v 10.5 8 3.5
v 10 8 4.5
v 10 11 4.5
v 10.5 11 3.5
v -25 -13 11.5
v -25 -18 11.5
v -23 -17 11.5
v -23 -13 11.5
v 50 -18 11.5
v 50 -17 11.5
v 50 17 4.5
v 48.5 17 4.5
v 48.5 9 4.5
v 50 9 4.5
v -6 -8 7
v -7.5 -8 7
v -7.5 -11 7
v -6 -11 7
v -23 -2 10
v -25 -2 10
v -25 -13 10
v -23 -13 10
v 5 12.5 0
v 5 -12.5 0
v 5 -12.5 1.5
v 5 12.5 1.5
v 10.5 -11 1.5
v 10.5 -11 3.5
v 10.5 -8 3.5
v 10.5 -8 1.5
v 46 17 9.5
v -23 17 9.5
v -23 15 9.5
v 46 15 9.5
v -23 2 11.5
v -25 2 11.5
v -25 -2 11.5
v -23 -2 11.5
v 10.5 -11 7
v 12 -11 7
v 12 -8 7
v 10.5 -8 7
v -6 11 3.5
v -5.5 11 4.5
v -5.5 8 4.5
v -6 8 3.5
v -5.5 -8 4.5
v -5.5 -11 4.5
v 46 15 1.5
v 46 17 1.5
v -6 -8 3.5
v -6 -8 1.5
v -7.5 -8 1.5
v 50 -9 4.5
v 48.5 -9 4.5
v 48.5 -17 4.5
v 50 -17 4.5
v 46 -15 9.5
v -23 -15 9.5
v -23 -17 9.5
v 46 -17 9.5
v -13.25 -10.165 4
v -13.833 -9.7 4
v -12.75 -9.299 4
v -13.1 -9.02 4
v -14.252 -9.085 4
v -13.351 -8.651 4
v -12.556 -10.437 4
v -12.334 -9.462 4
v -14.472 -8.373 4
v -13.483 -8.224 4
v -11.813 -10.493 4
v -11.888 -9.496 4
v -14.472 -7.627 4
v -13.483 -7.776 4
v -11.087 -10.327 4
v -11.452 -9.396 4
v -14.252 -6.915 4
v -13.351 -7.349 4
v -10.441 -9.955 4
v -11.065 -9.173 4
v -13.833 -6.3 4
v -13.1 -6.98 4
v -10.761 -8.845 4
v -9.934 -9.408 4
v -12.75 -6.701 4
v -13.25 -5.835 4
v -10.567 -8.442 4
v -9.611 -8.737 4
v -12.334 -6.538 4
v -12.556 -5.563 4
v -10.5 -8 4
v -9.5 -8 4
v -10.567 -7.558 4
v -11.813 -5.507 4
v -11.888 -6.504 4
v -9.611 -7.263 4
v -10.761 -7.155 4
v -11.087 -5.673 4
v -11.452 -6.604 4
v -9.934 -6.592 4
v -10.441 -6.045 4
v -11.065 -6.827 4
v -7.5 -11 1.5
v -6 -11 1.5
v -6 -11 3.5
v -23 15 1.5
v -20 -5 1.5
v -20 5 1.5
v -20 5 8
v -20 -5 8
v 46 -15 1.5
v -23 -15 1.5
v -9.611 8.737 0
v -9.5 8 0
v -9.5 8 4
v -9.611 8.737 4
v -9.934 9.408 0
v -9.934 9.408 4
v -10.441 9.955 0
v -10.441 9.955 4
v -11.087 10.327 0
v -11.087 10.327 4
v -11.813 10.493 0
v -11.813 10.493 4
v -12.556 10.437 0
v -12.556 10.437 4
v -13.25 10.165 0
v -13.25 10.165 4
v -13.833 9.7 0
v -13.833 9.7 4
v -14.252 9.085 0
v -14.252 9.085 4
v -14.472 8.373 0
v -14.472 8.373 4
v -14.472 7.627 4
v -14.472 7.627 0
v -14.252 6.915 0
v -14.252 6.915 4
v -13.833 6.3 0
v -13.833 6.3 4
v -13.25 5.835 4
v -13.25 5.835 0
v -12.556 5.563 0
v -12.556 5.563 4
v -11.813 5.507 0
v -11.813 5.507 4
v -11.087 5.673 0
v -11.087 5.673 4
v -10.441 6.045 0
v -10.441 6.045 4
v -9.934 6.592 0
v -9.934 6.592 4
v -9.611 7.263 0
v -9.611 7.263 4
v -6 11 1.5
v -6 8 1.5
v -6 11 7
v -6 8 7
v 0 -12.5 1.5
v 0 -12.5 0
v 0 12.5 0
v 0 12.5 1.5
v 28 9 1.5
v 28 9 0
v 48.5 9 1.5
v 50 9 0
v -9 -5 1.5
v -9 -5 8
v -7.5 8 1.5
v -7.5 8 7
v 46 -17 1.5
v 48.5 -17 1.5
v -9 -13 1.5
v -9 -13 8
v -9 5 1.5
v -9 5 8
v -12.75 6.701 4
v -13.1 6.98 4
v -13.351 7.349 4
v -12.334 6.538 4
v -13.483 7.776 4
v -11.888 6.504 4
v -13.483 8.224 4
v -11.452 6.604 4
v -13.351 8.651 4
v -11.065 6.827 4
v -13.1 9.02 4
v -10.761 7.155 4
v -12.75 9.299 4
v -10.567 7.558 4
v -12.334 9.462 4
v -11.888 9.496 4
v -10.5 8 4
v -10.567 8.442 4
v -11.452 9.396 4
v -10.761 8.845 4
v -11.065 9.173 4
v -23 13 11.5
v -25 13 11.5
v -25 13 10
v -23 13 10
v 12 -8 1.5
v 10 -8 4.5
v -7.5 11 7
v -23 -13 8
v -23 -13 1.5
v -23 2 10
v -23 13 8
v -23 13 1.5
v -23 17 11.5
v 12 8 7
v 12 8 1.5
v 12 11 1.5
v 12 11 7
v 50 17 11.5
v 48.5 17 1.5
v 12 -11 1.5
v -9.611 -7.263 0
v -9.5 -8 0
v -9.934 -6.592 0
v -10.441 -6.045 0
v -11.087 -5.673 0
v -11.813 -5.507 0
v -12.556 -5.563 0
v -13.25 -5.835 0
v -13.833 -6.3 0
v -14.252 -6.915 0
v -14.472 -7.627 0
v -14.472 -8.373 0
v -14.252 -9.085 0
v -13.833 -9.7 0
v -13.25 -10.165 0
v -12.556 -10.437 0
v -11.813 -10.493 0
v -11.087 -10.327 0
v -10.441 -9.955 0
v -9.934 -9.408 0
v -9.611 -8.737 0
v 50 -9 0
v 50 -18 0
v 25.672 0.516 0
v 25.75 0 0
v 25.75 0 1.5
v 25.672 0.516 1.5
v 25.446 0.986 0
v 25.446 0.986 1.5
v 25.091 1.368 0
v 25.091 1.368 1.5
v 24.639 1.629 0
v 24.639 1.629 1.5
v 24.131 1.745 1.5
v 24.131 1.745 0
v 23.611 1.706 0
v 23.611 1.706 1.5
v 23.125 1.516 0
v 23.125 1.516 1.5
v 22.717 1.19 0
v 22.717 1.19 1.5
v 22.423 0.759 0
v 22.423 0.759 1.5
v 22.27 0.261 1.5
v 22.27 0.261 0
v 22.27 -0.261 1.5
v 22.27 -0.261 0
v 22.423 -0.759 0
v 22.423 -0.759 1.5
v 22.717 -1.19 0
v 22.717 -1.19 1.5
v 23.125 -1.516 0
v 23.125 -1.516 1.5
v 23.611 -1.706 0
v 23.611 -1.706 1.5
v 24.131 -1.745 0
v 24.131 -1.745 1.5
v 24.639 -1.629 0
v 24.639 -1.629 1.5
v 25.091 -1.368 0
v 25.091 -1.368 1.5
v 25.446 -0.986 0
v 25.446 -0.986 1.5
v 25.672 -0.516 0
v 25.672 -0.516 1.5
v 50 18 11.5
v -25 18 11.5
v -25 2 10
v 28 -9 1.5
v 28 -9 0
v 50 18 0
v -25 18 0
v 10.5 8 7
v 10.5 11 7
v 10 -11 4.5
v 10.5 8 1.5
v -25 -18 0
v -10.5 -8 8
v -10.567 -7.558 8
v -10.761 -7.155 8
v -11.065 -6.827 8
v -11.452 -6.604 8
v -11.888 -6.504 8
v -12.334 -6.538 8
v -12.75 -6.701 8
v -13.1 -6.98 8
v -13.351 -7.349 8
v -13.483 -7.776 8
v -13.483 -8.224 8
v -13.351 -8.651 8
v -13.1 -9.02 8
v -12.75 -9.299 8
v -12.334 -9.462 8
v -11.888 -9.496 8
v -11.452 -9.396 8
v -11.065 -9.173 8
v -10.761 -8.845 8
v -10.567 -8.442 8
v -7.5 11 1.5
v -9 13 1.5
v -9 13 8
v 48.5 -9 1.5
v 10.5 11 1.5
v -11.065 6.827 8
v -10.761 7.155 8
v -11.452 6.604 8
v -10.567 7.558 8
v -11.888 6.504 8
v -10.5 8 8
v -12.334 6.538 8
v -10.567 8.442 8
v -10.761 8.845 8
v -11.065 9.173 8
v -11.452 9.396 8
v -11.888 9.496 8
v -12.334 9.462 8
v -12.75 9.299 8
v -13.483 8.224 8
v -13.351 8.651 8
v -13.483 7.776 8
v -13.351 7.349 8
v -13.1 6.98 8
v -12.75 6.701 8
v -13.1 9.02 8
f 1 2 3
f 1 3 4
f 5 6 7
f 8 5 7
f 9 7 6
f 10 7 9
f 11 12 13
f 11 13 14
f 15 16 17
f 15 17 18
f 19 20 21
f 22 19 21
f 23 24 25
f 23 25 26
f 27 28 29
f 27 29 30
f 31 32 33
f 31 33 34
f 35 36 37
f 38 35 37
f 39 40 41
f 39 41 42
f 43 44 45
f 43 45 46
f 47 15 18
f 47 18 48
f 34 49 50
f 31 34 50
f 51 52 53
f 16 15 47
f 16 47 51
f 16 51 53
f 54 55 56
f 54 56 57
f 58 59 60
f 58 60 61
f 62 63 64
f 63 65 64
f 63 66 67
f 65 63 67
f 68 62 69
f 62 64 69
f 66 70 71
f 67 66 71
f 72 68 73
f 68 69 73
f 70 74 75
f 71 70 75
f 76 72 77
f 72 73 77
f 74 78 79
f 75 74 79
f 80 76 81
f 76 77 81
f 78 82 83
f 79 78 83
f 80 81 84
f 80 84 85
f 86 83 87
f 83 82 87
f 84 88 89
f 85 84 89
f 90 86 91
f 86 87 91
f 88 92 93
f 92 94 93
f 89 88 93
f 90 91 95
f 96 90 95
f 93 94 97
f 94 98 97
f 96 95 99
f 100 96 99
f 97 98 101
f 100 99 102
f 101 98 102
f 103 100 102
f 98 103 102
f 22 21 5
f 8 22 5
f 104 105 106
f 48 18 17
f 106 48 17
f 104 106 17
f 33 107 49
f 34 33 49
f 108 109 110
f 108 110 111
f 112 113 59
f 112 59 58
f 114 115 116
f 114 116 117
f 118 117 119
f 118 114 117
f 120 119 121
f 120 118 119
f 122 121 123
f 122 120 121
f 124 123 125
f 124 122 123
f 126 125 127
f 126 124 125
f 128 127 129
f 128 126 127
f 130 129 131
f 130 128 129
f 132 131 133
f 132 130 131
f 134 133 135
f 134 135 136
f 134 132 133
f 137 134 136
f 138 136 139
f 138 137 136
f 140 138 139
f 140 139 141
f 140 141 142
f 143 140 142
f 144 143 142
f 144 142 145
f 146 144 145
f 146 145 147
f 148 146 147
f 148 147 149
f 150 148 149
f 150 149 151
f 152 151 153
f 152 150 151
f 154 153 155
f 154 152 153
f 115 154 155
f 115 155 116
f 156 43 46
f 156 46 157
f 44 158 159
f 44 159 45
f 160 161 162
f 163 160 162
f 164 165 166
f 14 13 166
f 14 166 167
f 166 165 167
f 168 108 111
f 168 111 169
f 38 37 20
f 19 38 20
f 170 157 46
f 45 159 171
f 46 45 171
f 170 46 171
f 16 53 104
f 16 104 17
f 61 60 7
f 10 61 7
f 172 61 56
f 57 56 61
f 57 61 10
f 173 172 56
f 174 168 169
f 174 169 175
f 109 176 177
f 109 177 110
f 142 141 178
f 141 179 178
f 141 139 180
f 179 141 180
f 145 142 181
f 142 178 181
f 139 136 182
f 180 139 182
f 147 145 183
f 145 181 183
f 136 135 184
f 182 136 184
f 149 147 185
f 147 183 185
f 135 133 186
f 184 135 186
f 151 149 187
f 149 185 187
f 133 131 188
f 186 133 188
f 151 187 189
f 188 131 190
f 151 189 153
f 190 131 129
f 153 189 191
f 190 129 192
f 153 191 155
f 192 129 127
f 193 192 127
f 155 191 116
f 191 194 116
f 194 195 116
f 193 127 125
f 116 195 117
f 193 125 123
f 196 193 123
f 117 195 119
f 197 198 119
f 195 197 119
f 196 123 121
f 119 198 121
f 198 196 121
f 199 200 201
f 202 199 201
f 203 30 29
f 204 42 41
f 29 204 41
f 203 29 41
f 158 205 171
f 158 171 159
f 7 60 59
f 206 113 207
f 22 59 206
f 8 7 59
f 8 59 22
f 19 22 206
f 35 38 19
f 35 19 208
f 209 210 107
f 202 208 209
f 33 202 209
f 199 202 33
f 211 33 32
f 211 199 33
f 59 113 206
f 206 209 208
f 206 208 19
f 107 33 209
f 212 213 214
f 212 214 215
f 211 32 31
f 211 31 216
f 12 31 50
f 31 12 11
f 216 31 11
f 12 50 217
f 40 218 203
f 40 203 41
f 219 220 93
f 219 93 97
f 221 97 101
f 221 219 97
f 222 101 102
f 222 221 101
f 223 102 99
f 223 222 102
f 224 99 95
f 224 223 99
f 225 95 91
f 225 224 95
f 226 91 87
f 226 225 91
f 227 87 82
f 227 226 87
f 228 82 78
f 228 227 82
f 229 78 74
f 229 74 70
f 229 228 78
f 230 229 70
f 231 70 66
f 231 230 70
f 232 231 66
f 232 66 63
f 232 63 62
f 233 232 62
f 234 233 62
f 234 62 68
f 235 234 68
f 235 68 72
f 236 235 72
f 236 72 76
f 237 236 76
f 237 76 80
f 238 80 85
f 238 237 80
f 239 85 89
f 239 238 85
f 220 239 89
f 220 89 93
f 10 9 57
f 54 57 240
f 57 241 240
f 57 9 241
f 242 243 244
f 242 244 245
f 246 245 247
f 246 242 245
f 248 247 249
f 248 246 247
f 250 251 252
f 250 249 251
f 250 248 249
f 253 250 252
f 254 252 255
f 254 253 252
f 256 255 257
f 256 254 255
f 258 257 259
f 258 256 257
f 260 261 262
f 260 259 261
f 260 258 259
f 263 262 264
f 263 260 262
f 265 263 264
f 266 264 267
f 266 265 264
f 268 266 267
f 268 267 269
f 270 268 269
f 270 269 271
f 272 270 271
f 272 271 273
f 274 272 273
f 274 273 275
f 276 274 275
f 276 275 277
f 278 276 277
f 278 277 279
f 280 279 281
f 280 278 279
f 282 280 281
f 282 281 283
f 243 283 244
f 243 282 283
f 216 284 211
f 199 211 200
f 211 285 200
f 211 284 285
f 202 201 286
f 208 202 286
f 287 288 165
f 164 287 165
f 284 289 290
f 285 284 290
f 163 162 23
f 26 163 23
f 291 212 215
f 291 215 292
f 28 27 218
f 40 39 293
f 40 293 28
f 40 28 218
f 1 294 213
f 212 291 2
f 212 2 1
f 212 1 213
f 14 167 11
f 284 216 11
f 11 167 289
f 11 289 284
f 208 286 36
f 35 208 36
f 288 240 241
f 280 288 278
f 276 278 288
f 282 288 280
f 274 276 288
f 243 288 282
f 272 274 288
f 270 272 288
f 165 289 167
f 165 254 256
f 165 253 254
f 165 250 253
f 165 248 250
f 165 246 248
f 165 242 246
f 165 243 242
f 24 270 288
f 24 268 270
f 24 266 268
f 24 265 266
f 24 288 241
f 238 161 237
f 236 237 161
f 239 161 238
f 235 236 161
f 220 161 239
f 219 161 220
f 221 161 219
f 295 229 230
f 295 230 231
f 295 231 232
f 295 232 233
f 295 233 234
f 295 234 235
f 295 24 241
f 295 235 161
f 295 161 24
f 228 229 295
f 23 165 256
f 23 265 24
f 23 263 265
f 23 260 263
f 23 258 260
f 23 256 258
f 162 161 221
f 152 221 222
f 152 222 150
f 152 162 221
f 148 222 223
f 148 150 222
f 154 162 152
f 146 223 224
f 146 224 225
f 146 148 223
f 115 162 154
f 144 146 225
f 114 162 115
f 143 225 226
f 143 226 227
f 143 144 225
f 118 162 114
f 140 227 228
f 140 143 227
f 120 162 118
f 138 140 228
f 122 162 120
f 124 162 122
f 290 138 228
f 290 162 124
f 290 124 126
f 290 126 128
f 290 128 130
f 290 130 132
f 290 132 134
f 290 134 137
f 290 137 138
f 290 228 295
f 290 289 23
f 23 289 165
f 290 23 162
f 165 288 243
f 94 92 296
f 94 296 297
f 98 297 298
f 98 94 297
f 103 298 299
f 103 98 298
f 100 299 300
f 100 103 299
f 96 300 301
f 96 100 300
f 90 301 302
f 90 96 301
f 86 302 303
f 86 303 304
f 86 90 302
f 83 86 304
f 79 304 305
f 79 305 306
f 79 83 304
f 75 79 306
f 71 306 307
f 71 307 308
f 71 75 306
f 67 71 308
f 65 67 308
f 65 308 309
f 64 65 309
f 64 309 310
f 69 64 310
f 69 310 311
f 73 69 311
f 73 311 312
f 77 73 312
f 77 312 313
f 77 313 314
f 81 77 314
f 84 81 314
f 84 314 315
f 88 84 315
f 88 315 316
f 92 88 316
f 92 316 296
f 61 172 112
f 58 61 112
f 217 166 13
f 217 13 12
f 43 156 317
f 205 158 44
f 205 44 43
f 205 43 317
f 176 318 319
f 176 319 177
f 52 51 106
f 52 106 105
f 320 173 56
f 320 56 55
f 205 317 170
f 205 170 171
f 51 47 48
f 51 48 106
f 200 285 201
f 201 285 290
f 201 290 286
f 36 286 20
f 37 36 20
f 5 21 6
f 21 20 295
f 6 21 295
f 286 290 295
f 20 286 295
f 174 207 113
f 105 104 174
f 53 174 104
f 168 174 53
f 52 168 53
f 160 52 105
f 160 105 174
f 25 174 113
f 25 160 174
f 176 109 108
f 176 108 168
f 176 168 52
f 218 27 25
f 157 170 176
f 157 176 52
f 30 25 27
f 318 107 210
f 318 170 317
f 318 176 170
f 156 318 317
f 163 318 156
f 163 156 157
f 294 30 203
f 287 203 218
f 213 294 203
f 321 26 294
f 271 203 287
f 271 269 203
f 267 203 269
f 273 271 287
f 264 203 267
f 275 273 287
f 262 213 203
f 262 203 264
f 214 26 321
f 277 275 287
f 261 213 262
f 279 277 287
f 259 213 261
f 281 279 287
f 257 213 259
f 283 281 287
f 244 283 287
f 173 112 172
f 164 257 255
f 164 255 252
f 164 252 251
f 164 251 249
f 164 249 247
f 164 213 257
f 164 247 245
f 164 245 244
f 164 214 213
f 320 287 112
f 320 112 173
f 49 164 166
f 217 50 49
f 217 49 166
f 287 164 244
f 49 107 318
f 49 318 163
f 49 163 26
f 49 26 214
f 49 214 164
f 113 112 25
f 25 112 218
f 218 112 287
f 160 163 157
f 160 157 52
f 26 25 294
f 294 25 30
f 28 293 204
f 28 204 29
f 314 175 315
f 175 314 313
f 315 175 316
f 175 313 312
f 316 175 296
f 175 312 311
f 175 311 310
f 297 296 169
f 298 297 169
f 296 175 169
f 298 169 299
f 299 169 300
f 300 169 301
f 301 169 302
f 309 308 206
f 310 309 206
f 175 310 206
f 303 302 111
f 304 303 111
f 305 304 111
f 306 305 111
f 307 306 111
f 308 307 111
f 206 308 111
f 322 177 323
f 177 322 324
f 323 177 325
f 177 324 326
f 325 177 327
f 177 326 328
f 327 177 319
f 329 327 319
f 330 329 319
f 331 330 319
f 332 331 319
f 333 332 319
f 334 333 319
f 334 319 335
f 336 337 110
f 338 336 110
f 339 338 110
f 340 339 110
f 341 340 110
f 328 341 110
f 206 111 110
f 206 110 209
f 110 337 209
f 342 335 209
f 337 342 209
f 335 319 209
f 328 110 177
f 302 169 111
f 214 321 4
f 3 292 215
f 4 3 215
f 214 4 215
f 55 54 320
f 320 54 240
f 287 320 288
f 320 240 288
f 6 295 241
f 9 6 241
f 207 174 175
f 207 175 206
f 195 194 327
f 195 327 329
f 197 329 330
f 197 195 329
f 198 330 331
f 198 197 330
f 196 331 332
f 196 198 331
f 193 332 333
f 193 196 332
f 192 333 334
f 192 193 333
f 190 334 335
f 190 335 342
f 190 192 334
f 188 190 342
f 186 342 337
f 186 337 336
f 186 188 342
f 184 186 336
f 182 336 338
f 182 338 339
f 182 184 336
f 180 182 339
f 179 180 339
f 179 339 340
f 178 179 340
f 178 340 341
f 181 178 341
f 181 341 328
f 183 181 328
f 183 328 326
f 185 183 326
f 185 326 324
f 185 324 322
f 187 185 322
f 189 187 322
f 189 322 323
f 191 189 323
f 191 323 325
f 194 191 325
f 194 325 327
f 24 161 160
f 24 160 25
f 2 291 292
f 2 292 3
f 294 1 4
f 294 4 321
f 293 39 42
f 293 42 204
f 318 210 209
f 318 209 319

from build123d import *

# Parameters (mm, degrees)
CYLINDER002_R                        = 1.75
CYLINDER002_DEPTH                    = 19
CYLINDER003_R                        = 2.5
CYLINDER003_DEPTH                    = 4
CYLINDER004_R                        = 2.5
CYLINDER004_DEPTH                    = 4
BOX003_W                             = 71
BOX003_H                             = 2
BOX003_DEPTH                         = 8
BOX004_W                             = 1.5
BOX004_H                             = 9
BOX004_DEPTH                         = 3
BOX005_W                             = 1.5
BOX005_H                             = 9
BOX005_DEPTH                         = 3
BOX001_W                             = 75
BOX001_H                             = 1
BOX001_DEPTH                         = 10
BOX002_W                             = 71
BOX002_H                             = 2
BOX002_DEPTH                         = 8
EXTRUDE001_DEPTH                     = 2
SKETCH_W                             = 5
SKETCH_H                             = 25
EXTRUDE_DEPTH                        = 1.5
SKETCH004_R                          = 1.5
EXTRUDE003_DEPTH                     = 8
EXTRUDE008_DEPTH                     = 3
EXTRUDE008_ONTO_SKETCH007_ROLL_ANGLE = 90
EXTRUDE008_PLACEMENT_ANGLE           = 180
EXTRUDE007_DEPTH                     = 3
EXTRUDE007_ONTO_SKETCH006_ROLL_ANGLE = 90
EXTRUDE007_PLACEMENT_ANGLE           = 180
EXTRUDE006_DEPTH                     = 3
EXTRUDE006_ONTO_SKETCH006_ROLL_ANGLE = 90
EXTRUDE005_DEPTH                     = 3
EXTRUDE005_ONTO_SKETCH006_ROLL_ANGLE = 90
BOX_W                                = 75
BOX_H                                = 1
BOX_DEPTH                            = 10


with BuildPart() as cylinder002:
    # Cylinder002 → Cylinder002 (new body)
    with BuildSketch(Plane(origin=(24, 0, -8), x_dir=(1, 0, 0), z_dir=(0, 0, 1))):
        Circle(CYLINDER002_R)
    extrude(amount=CYLINDER002_DEPTH)


with BuildPart() as cylinder003:
    # Cylinder003 → Cylinder003 (new body)
    with BuildSketch(Plane(origin=(-12, -8, 0), x_dir=(1, 0, 0), z_dir=(0, 0, 1))):
        Circle(CYLINDER003_R)
    extrude(amount=CYLINDER003_DEPTH)


with BuildPart() as holesside1:
    # Cylinder004 → Cylinder004 (new body)
    with BuildSketch(Plane(origin=(-12, 8, 0), x_dir=(1, 0, 0), z_dir=(0, 0, 1))):
        Circle(CYLINDER004_R)
    extrude(amount=CYLINDER004_DEPTH)

    # Fusion005: union Cylinder002, Cylinder003
    add(cylinder002.part)
    add(cylinder003.part)


with BuildPart() as sidewall004:
    # Box003 → Box003 (new body)
    with BuildSketch(Plane(origin=(-25, 15, 1.5), x_dir=(1, 0, 0), z_dir=(0, 0, 1))):
        with Locations((35.5, 1)):
            Rectangle(BOX003_W, BOX003_H)
    extrude(amount=BOX003_DEPTH)


with BuildPart() as cube:
    # Box004 → Box004 (new body)
    with BuildSketch(Plane(origin=(48.5, 9, 1.5), x_dir=(1, 0, 0), z_dir=(0, 0, 1))):
        with Locations((0.75, 4.5)):
            Rectangle(BOX004_W, BOX004_H)
    extrude(amount=BOX004_DEPTH)


with BuildPart() as cube001:
    # Box005 → Box005 (new body)
    with BuildSketch(Plane(origin=(48.5, -18, 1.5), x_dir=(1, 0, 0), z_dir=(0, 0, 1))):
        with Locations((0.75, 4.5)):
            Rectangle(BOX005_W, BOX005_H)
    extrude(amount=BOX005_DEPTH)


with BuildPart() as sidewall002:
    # Box001 → Box001 (new body)
    with BuildSketch(Plane(origin=(-25, 17, 1.5), x_dir=(1, 0, 0), z_dir=(0, 0, 1))):
        with Locations((37.5, 0.5)):
            Rectangle(BOX001_W, BOX001_H)
    extrude(amount=BOX001_DEPTH)


with BuildPart() as sidewall003:
    # Box002 → Box002 (new body)
    with BuildSketch(Plane(origin=(-25, -17, 1.5), x_dir=(1, 0, 0), z_dir=(0, 0, 1))):
        with Locations((35.5, 1)):
            Rectangle(BOX002_W, BOX002_H)
    extrude(amount=BOX002_DEPTH)


with BuildPart() as extrude001:
    # Sketch001 → Extrude001 (new body)
    with BuildSketch(Plane.YZ):
        Polygon((-18, 0), (18, 0), (18, 10), (13, 10), (13, 8.5), (2, 8.5), (2, 10), (-2, 10), (-2, 8.5), (-13, 8.5), (-13, 10), (-18, 10), align=None)
    extrude(amount=EXTRUDE001_DEPTH)


with BuildPart() as extrude001_1:
    # Extrude001 placement: moved
    add(extrude001.part.moved(Location((-25, 0, 1.5))))


with BuildPart() as extrude_body:
    # Sketch → Extrude (new body)
    with BuildSketch(Plane.XY):
        Polygon((-25, 18), (-25, -18), (50, -18), (50, -9), (28, -9), (28, 9), (50, 9), (50, 18), align=None)
        with Locations((2.5, 0)):
            Rectangle(SKETCH_W, SKETCH_H, mode=Mode.SUBTRACT)
    extrude(amount=EXTRUDE_DEPTH)


with BuildPart() as extrude003:
    # Sketch004 → Extrude003 (new body)
    with BuildSketch(Plane.XY):
        Polygon((-3, 13), (11, 13), (11, 5), (0, 5), (0, -5), (11, -5), (11, -13), (-3, -13), align=None)
        with Locations((8, 8)):
            Circle(SKETCH004_R, mode=Mode.SUBTRACT)
        with Locations((8, -8)):
            Circle(SKETCH004_R, mode=Mode.SUBTRACT)
    extrude(amount=EXTRUDE003_DEPTH)


with BuildPart() as extrude003_1:
    # Extrude003 placement: moved
    add(extrude003.part.moved(Location((-20, 0, 0))))


with BuildPart() as extrude008:
    # Sketch007 as drawn → Extrude008 (new)
    with BuildSketch(Plane.XY):
        Polygon((0, 0), (-1.5, 0), (-1.5, 5.5), (0, 5.5), (0.5, 3), (0, 2), align=None)
    extrude(amount=EXTRUDE008_DEPTH)


with BuildPart() as extrude008_1:
    # Extrude008 onto Sketch007 roll: moved
    add(extrude008.part.rotate(Axis((0, 0, 0), (1, 0, 0)), EXTRUDE008_ONTO_SKETCH007_ROLL_ANGLE))


with BuildPart() as extrude008_2:
    # Extrude008 onto Sketch007 placement: moved
    add(extrude008_1.part)


with BuildPart() as extrude008_3:
    # Extrude008 placement: moved
    add(extrude008_2.part.moved(Location((10.5, -11, 1.5))).rotate(Axis((10.5, -11, 1.5), (0, 0, 1)), EXTRUDE008_PLACEMENT_ANGLE))


with BuildPart() as extrude007:
    # Sketch006 as drawn → Extrude007 (new)
    with BuildSketch(Plane.XY):
        Polygon((0, 0), (-1.5, 0), (-1.5, 5.5), (0, 5.5), (0.5, 3), (0, 2), align=None)
    extrude(amount=EXTRUDE007_DEPTH)


with BuildPart() as extrude007_1:
    # Extrude007 onto Sketch006 roll: moved
    add(extrude007.part.rotate(Axis((0, 0, 0), (1, 0, 0)), EXTRUDE007_ONTO_SKETCH006_ROLL_ANGLE))


with BuildPart() as extrude007_2:
    # Extrude007 onto Sketch006 placement: moved
    add(extrude007_1.part)


with BuildPart() as extrude007_3:
    # Extrude007 placement: moved
    add(extrude007_2.part.moved(Location((10.5, 8, 1.5))).rotate(Axis((10.5, 8, 1.5), (0, 0, 1)), EXTRUDE007_PLACEMENT_ANGLE))


with BuildPart() as extrude006:
    # Sketch006 as drawn → Extrude006 (new)
    with BuildSketch(Plane.XY):
        Polygon((0, 0), (-1.5, 0), (-1.5, 5.5), (0, 5.5), (0.5, 3), (0, 2), align=None)
    extrude(amount=EXTRUDE006_DEPTH)


with BuildPart() as extrude006_1:
    # Extrude006 onto Sketch006 roll: moved
    add(extrude006.part.rotate(Axis((0, 0, 0), (1, 0, 0)), EXTRUDE006_ONTO_SKETCH006_ROLL_ANGLE))


with BuildPart() as extrude006_2:
    # Extrude006 onto Sketch006 placement: moved
    add(extrude006_1.part)


with BuildPart() as extrude006_3:
    # Extrude006 placement: moved
    add(extrude006_2.part.moved(Location((-6, -8, 1.5))))


with BuildPart() as pcb_holder:
    # Sketch006 as drawn → Extrude005 (new)
    with BuildSketch(Plane.XY):
        Polygon((0, 0), (-1.5, 0), (-1.5, 5.5), (0, 5.5), (0.5, 3), (0, 2), align=None)
    extrude(amount=EXTRUDE005_DEPTH)


with BuildPart() as pcb_holder_1:
    # Extrude005 onto Sketch006 roll: moved
    add(pcb_holder.part.rotate(Axis((0, 0, 0), (1, 0, 0)), EXTRUDE005_ONTO_SKETCH006_ROLL_ANGLE))


with BuildPart() as pcb_holder_2:
    # Extrude005 onto Sketch006 placement: moved
    add(pcb_holder_1.part)


with BuildPart() as pcb_holder_3:
    # Extrude005 placement: moved
    add(pcb_holder_2.part.moved(Location((-6, 11, 1.5))))

    # Fusion007: union Extrude008, Extrude007, Extrude006
    add(extrude008_3.part)
    add(extrude007_3.part)
    add(extrude006_3.part)


with BuildPart() as side1withholes:
    # Box → Box (new body)
    with BuildSketch(Plane(origin=(-25, -18, 1.5), x_dir=(1, 0, 0), z_dir=(0, 0, 1))):
        with Locations((37.5, 0.5)):
            Rectangle(BOX_W, BOX_H)
    extrude(amount=BOX_DEPTH)

    # Fusion: union sidewall004, Cube, Cube001, sidewall002, sidewall003, Extrude001, Extrude body, Extrude003, pcb_holder
    add(sidewall004.part)
    add(cube.part)
    add(cube001.part)
    add(sidewall002.part)
    add(sidewall003.part)
    add(extrude001_1.part)
    add(extrude_body.part)
    add(extrude003_1.part)
    add(pcb_holder_3.part)

    # Cut001: cut HolesSide1
    add(holesside1.part, mode=Mode.SUBTRACT)


solid = side1withholes.part
